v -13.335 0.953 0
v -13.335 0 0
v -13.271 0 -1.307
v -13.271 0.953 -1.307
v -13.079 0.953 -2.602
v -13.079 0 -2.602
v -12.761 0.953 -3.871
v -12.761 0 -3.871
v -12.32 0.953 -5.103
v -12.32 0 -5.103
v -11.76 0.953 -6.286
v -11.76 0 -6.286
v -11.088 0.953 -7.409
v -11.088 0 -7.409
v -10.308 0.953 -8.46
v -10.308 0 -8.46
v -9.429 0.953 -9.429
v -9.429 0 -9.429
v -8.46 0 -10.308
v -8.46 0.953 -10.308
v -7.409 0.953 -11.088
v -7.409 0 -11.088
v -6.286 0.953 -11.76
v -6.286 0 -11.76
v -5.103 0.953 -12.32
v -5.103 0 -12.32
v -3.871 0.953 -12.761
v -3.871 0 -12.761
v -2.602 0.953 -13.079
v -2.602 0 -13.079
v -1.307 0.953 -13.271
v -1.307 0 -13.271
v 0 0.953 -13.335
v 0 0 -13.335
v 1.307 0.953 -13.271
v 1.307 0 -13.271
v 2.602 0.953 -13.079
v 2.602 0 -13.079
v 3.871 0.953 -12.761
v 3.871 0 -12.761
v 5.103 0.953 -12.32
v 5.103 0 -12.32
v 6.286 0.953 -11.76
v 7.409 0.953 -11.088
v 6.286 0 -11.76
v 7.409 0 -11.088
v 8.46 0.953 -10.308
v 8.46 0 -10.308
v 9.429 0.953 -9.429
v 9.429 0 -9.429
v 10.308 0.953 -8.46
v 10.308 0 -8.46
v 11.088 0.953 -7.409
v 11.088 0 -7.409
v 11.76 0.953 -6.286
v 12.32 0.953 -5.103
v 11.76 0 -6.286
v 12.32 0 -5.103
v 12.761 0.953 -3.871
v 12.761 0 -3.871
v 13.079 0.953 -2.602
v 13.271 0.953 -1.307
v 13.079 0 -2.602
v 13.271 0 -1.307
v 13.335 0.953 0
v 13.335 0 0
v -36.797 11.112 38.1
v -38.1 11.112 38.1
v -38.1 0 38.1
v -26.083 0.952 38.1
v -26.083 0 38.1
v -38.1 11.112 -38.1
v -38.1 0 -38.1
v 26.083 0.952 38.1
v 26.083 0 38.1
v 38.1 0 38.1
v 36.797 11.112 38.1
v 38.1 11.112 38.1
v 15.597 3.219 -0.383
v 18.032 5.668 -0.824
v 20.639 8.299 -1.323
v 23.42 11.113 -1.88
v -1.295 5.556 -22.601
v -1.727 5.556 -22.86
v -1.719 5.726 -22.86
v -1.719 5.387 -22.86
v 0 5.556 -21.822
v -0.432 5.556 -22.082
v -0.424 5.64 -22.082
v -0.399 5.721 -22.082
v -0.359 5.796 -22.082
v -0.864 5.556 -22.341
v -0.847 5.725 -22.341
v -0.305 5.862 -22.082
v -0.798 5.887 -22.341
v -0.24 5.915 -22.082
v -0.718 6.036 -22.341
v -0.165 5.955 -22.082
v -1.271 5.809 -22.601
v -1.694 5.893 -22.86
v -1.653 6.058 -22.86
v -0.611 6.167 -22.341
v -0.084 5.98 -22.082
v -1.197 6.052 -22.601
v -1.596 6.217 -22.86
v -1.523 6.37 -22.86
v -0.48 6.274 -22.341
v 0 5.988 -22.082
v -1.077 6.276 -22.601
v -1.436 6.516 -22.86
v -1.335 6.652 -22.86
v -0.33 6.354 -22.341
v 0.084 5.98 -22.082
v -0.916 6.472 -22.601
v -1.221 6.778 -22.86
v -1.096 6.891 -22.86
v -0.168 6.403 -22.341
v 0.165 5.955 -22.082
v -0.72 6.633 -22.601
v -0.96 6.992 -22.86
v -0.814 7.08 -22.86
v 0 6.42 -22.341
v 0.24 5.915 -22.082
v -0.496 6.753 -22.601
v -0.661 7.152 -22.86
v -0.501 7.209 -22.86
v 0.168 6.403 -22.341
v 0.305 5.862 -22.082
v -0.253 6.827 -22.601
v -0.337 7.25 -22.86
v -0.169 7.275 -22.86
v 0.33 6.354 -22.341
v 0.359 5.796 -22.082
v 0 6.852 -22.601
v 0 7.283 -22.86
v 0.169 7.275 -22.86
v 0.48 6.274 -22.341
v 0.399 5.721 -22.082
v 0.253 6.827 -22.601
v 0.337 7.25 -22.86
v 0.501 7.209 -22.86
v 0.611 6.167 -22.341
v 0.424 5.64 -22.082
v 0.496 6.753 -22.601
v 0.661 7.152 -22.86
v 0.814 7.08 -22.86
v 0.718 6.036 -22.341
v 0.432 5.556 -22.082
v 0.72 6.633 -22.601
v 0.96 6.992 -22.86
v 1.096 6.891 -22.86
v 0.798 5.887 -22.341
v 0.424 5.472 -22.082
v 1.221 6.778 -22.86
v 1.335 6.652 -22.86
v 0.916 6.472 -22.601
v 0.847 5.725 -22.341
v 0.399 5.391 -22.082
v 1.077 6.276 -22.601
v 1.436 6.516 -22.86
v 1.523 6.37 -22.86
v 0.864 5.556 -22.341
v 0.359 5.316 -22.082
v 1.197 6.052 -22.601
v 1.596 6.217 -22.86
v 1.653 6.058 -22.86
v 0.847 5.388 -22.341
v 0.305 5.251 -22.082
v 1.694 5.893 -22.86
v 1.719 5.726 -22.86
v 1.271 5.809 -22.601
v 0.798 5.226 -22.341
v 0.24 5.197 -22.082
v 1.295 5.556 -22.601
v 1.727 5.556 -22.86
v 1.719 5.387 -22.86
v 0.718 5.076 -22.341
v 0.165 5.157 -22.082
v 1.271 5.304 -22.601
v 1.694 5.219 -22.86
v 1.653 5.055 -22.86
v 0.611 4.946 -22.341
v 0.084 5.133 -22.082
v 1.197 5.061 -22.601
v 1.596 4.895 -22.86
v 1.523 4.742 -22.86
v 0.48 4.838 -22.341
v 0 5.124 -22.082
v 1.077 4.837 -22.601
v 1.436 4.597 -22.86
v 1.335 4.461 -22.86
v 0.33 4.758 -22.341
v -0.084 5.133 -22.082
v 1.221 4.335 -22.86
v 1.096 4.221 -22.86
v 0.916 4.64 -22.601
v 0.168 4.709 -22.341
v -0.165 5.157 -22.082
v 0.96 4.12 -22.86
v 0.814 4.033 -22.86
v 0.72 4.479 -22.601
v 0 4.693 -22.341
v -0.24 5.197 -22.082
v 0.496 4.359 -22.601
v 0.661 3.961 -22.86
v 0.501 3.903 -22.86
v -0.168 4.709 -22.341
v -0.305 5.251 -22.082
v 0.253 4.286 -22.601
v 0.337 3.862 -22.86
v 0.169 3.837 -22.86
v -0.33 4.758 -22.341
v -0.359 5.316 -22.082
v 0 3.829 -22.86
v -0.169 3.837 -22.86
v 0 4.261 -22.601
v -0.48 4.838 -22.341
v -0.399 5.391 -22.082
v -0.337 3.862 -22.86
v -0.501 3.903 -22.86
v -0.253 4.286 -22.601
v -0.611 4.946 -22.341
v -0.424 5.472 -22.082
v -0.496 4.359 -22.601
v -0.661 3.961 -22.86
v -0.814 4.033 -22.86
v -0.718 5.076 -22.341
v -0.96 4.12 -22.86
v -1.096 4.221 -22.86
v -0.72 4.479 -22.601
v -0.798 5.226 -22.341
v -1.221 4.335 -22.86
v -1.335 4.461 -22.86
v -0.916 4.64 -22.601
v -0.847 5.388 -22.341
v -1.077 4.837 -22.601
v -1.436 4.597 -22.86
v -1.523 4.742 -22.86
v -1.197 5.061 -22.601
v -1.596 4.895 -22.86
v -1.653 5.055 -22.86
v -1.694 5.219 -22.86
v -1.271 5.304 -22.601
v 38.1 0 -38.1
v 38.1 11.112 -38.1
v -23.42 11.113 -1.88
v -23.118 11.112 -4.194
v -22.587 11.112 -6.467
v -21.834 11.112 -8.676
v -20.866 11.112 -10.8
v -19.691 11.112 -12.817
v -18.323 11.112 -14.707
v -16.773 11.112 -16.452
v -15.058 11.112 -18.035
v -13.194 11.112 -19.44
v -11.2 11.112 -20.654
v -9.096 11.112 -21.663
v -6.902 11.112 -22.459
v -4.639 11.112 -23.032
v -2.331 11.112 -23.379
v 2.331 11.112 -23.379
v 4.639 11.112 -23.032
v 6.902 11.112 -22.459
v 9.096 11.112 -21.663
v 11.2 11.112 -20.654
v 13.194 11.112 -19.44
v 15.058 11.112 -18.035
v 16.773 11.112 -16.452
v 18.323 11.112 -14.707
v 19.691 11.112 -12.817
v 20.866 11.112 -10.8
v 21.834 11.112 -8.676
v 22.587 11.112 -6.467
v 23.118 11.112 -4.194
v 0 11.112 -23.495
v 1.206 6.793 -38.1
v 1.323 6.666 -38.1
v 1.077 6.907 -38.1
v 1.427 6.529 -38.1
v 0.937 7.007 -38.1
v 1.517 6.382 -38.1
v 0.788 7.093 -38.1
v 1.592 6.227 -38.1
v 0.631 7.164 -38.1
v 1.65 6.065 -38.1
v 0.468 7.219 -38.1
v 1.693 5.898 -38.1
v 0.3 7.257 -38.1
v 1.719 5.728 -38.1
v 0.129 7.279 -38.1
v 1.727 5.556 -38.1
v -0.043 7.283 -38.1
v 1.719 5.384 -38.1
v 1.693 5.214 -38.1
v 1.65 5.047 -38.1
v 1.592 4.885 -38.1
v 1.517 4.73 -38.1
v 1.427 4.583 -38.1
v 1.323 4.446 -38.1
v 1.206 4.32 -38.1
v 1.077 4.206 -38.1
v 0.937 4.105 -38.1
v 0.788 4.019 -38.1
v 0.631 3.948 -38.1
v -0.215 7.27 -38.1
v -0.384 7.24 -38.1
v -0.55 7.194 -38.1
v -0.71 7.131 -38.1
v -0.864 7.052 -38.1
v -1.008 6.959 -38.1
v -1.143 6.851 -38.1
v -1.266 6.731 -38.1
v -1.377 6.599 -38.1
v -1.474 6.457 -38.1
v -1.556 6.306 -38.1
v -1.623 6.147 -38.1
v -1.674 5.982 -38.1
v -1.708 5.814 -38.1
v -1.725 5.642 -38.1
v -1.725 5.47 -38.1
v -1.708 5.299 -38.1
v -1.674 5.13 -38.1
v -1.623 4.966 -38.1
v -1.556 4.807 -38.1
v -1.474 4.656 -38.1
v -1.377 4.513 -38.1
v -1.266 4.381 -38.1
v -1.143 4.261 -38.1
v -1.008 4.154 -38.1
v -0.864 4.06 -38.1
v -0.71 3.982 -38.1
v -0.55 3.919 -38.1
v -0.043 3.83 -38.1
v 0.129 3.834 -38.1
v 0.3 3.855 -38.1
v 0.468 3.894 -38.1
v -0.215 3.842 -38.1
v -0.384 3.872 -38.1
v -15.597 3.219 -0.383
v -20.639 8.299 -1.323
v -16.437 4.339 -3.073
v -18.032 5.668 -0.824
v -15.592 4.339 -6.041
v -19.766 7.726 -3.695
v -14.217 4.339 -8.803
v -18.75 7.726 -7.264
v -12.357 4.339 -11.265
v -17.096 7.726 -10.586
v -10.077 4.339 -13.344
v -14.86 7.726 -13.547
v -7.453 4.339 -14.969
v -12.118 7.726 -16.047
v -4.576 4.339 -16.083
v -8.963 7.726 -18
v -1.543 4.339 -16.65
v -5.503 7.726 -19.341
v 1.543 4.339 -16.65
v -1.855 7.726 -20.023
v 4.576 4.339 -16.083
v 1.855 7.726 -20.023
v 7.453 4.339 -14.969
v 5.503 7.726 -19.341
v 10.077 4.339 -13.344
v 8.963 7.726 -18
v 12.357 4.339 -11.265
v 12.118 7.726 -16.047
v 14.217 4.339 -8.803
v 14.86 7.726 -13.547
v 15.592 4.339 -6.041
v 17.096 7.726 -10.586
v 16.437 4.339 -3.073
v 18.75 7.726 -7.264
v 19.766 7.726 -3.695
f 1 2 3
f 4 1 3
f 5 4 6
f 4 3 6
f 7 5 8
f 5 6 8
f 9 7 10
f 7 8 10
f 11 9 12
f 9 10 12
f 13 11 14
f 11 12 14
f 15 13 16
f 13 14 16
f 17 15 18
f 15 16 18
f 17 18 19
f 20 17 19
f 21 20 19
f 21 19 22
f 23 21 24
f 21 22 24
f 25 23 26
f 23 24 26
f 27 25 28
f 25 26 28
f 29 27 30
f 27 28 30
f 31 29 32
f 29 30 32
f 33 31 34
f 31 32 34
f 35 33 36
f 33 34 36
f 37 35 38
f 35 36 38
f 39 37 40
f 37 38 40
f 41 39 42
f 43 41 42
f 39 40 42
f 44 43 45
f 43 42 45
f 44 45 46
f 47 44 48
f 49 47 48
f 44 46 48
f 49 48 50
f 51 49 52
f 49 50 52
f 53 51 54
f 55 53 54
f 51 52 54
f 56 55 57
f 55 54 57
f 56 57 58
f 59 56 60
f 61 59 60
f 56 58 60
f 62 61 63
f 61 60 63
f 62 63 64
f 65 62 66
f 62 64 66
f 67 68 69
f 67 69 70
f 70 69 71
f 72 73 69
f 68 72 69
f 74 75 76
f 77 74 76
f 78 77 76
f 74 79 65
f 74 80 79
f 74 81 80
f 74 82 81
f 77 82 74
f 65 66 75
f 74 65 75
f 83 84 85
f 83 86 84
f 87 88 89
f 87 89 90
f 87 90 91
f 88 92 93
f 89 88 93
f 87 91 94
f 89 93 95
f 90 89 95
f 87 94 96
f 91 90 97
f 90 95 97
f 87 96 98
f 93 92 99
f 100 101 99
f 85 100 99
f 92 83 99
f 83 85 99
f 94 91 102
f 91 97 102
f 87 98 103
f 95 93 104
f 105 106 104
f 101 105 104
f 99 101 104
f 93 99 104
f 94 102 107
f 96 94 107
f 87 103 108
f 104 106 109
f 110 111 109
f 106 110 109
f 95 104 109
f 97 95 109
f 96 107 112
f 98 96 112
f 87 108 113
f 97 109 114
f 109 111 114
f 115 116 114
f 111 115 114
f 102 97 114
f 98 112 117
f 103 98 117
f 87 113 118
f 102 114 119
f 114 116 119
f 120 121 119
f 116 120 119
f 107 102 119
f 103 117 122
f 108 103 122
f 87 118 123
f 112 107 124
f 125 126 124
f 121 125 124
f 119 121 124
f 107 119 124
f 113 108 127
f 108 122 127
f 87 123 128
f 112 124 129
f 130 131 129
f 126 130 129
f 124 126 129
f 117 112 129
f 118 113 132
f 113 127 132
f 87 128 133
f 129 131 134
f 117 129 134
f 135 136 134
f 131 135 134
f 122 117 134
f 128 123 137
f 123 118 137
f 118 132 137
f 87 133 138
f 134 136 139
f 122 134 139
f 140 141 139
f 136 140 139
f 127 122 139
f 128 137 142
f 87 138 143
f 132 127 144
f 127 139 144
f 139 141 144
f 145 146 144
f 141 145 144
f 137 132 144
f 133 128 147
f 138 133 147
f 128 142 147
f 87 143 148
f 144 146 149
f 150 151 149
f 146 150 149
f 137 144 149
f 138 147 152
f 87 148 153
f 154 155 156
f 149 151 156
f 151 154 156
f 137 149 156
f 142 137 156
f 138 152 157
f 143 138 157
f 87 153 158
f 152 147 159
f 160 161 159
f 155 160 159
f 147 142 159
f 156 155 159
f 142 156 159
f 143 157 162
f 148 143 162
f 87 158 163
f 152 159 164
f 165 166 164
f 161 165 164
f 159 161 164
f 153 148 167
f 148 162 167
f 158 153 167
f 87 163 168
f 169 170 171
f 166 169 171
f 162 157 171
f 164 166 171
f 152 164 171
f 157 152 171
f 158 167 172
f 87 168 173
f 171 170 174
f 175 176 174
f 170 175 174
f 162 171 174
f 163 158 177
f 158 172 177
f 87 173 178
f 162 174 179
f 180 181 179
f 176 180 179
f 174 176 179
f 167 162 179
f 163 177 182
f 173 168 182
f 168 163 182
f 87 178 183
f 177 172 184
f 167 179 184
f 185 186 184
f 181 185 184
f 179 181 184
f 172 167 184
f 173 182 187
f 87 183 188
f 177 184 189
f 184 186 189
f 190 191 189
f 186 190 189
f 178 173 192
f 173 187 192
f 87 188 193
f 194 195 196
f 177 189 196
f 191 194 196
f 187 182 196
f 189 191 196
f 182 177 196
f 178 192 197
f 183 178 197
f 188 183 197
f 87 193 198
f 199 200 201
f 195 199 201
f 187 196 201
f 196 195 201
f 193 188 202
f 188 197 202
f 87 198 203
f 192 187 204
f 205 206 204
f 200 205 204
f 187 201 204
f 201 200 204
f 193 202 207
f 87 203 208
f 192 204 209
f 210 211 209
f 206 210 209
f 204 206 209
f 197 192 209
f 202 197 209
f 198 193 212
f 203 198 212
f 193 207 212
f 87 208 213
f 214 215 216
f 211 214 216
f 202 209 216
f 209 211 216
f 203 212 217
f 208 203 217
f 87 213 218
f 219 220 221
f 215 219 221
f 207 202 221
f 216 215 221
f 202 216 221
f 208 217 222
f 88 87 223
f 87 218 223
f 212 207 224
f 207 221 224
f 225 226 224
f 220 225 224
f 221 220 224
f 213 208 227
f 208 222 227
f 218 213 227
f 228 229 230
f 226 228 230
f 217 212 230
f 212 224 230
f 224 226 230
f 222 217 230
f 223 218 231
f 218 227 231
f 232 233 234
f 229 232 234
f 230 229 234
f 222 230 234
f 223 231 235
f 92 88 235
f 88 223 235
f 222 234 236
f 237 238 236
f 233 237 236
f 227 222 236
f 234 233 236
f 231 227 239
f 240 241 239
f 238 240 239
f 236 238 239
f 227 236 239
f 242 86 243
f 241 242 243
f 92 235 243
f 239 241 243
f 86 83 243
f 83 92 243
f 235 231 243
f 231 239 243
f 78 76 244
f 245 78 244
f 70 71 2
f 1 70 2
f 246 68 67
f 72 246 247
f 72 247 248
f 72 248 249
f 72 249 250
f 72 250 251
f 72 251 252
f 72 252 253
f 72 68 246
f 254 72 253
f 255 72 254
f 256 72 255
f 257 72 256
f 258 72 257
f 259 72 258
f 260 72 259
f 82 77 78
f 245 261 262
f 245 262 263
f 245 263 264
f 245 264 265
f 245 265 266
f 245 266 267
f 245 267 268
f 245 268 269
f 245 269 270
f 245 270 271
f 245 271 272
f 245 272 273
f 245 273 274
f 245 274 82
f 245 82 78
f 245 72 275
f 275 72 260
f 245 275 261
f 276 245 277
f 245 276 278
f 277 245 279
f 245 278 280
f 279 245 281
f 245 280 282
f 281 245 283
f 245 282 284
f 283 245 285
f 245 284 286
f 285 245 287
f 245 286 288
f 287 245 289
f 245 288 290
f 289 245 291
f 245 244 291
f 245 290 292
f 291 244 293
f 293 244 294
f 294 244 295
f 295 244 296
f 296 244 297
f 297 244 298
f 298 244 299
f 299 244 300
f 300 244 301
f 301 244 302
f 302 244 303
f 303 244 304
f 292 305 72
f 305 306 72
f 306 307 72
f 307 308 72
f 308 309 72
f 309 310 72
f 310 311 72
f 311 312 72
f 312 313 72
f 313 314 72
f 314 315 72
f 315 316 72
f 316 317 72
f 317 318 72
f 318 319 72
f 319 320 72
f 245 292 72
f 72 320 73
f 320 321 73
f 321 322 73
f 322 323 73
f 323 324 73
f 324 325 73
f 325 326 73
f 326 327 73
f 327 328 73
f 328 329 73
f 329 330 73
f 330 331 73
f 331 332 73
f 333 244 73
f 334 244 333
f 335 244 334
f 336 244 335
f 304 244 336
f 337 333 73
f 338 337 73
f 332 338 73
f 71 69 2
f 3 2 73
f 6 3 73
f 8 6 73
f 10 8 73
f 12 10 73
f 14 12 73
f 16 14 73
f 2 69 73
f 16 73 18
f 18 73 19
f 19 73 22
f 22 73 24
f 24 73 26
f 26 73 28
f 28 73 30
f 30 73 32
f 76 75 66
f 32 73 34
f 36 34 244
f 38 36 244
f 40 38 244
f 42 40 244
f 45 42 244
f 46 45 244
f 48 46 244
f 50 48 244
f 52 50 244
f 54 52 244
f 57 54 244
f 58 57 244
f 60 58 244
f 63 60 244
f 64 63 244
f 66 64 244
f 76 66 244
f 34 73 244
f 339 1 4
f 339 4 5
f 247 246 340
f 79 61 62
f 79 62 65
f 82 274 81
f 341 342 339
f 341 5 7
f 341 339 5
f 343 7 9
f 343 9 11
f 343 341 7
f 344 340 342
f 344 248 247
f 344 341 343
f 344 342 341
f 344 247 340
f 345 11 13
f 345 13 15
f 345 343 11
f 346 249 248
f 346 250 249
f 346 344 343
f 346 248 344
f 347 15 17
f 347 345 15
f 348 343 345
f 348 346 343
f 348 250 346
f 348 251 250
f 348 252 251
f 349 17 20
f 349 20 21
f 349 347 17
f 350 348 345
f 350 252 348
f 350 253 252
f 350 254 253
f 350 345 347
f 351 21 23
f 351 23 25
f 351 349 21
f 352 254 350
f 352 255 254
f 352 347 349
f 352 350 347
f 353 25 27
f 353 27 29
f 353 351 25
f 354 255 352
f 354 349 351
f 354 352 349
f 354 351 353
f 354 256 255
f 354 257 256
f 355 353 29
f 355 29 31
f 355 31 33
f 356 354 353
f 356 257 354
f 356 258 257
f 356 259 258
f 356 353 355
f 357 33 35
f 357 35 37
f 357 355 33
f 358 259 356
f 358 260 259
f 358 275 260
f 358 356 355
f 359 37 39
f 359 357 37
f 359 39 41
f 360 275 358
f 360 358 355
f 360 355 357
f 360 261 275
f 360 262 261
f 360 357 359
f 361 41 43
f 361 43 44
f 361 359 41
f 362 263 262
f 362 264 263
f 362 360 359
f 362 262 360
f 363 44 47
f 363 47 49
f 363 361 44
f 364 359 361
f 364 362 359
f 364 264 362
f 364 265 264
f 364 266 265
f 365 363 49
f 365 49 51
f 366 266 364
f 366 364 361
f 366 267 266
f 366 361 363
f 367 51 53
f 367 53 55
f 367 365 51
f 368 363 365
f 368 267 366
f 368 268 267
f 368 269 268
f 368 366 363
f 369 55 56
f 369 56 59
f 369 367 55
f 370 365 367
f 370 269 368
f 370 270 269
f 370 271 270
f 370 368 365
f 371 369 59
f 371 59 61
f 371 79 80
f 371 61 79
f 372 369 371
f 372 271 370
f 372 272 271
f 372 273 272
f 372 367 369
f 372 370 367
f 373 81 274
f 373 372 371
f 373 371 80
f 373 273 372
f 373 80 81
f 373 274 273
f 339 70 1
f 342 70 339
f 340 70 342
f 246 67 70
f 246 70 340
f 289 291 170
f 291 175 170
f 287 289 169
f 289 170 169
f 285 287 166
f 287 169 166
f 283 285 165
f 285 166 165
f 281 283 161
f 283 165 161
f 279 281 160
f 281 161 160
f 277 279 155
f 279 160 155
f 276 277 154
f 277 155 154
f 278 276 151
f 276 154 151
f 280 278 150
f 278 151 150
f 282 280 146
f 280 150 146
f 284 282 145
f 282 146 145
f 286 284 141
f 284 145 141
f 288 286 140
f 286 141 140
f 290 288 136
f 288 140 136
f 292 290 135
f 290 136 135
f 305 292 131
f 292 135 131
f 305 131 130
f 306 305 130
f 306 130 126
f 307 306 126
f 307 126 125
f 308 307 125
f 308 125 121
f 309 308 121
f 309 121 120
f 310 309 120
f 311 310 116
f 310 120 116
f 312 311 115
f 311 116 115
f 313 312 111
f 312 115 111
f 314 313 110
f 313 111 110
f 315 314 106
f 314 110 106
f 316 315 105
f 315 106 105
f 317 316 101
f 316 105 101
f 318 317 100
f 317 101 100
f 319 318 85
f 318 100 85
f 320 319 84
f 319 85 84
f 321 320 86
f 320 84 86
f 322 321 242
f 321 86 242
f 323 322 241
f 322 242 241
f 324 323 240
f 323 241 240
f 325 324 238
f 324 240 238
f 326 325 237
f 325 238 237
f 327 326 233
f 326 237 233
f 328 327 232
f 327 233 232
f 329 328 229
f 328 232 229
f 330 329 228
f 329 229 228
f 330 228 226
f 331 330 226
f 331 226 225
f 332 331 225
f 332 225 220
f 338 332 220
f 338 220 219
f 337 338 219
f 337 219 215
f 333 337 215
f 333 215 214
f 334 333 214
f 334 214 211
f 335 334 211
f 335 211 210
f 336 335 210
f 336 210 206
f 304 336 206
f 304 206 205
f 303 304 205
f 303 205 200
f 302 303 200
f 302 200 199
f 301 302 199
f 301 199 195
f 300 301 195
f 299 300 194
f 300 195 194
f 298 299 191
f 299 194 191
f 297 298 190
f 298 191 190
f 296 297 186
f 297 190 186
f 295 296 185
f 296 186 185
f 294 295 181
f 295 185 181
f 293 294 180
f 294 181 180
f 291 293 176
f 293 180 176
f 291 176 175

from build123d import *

# Parameters (mm, degrees)
BOSS_EXTRUDE1_DEPTH           = 11.1125
CHAMFER1_SIZE                 = 10.16
TAP_DRILL_FOR_8_32_TAP1_D     = 3.4544
TAP_DRILL_FOR_8_32_TAP1_DEPTH = 15.24
TAP_DRILL_FOR_8_32_TAP1_TIP   = 1.037806461


with BuildPart() as part:
    # Sketch1 → Boss-Extrude1 (new body)
    with BuildSketch(Plane(origin=(0, 0, 0), x_dir=(1, 0, 0), z_dir=(0, 1, 0))):
        with BuildLine():
            Line((-26.083081673, -38.1), (-13.335, 0))
            ThreePointArc((-13.335, 0), (0, 13.335), (13.335, 0))
            Line((13.335, 0), (26.083081673, -38.1))
            Line((26.083081673, -38.1), (38.1, -38.1))
            Line((38.1, -38.1), (38.1, 38.1))
            Line((38.1, 38.1), (-38.1, 38.1))
            Line((-38.1, 38.1), (-38.1, -38.1))
            Line((-38.1, -38.1), (-26.083081673, -38.1))
        make_face()
    extrude(amount=BOSS_EXTRUDE1_DEPTH)

    # Chamfer1
    chamfer1_edges = [part.edges().sort_by_distance(p)[0] for p in [
        (19.709040837, 11.1125, 19.05),
        (-19.709040837, 11.1125, 19.05),
        (0, 11.1125, -13.335),
    ]]
    chamfer(chamfer1_edges, length=CHAMFER1_SIZE)

    # Tap Drill for #8-32 Tap1
    with Locations(Plane(origin=(0, 5.55625, -38.1), x_dir=(-1, 0, 0), z_dir=(0, 0, -1))):
        with Locations((0, 0)):
            Hole(TAP_DRILL_FOR_8_32_TAP1_D / 2, depth=TAP_DRILL_FOR_8_32_TAP1_DEPTH)
            with Locations((0, 0, -(TAP_DRILL_FOR_8_32_TAP1_DEPTH + TAP_DRILL_FOR_8_32_TAP1_TIP / 2))):  # 118° drill point
                Cone(0, TAP_DRILL_FOR_8_32_TAP1_D / 2, TAP_DRILL_FOR_8_32_TAP1_TIP, mode=Mode.SUBTRACT)


solid = part.part
